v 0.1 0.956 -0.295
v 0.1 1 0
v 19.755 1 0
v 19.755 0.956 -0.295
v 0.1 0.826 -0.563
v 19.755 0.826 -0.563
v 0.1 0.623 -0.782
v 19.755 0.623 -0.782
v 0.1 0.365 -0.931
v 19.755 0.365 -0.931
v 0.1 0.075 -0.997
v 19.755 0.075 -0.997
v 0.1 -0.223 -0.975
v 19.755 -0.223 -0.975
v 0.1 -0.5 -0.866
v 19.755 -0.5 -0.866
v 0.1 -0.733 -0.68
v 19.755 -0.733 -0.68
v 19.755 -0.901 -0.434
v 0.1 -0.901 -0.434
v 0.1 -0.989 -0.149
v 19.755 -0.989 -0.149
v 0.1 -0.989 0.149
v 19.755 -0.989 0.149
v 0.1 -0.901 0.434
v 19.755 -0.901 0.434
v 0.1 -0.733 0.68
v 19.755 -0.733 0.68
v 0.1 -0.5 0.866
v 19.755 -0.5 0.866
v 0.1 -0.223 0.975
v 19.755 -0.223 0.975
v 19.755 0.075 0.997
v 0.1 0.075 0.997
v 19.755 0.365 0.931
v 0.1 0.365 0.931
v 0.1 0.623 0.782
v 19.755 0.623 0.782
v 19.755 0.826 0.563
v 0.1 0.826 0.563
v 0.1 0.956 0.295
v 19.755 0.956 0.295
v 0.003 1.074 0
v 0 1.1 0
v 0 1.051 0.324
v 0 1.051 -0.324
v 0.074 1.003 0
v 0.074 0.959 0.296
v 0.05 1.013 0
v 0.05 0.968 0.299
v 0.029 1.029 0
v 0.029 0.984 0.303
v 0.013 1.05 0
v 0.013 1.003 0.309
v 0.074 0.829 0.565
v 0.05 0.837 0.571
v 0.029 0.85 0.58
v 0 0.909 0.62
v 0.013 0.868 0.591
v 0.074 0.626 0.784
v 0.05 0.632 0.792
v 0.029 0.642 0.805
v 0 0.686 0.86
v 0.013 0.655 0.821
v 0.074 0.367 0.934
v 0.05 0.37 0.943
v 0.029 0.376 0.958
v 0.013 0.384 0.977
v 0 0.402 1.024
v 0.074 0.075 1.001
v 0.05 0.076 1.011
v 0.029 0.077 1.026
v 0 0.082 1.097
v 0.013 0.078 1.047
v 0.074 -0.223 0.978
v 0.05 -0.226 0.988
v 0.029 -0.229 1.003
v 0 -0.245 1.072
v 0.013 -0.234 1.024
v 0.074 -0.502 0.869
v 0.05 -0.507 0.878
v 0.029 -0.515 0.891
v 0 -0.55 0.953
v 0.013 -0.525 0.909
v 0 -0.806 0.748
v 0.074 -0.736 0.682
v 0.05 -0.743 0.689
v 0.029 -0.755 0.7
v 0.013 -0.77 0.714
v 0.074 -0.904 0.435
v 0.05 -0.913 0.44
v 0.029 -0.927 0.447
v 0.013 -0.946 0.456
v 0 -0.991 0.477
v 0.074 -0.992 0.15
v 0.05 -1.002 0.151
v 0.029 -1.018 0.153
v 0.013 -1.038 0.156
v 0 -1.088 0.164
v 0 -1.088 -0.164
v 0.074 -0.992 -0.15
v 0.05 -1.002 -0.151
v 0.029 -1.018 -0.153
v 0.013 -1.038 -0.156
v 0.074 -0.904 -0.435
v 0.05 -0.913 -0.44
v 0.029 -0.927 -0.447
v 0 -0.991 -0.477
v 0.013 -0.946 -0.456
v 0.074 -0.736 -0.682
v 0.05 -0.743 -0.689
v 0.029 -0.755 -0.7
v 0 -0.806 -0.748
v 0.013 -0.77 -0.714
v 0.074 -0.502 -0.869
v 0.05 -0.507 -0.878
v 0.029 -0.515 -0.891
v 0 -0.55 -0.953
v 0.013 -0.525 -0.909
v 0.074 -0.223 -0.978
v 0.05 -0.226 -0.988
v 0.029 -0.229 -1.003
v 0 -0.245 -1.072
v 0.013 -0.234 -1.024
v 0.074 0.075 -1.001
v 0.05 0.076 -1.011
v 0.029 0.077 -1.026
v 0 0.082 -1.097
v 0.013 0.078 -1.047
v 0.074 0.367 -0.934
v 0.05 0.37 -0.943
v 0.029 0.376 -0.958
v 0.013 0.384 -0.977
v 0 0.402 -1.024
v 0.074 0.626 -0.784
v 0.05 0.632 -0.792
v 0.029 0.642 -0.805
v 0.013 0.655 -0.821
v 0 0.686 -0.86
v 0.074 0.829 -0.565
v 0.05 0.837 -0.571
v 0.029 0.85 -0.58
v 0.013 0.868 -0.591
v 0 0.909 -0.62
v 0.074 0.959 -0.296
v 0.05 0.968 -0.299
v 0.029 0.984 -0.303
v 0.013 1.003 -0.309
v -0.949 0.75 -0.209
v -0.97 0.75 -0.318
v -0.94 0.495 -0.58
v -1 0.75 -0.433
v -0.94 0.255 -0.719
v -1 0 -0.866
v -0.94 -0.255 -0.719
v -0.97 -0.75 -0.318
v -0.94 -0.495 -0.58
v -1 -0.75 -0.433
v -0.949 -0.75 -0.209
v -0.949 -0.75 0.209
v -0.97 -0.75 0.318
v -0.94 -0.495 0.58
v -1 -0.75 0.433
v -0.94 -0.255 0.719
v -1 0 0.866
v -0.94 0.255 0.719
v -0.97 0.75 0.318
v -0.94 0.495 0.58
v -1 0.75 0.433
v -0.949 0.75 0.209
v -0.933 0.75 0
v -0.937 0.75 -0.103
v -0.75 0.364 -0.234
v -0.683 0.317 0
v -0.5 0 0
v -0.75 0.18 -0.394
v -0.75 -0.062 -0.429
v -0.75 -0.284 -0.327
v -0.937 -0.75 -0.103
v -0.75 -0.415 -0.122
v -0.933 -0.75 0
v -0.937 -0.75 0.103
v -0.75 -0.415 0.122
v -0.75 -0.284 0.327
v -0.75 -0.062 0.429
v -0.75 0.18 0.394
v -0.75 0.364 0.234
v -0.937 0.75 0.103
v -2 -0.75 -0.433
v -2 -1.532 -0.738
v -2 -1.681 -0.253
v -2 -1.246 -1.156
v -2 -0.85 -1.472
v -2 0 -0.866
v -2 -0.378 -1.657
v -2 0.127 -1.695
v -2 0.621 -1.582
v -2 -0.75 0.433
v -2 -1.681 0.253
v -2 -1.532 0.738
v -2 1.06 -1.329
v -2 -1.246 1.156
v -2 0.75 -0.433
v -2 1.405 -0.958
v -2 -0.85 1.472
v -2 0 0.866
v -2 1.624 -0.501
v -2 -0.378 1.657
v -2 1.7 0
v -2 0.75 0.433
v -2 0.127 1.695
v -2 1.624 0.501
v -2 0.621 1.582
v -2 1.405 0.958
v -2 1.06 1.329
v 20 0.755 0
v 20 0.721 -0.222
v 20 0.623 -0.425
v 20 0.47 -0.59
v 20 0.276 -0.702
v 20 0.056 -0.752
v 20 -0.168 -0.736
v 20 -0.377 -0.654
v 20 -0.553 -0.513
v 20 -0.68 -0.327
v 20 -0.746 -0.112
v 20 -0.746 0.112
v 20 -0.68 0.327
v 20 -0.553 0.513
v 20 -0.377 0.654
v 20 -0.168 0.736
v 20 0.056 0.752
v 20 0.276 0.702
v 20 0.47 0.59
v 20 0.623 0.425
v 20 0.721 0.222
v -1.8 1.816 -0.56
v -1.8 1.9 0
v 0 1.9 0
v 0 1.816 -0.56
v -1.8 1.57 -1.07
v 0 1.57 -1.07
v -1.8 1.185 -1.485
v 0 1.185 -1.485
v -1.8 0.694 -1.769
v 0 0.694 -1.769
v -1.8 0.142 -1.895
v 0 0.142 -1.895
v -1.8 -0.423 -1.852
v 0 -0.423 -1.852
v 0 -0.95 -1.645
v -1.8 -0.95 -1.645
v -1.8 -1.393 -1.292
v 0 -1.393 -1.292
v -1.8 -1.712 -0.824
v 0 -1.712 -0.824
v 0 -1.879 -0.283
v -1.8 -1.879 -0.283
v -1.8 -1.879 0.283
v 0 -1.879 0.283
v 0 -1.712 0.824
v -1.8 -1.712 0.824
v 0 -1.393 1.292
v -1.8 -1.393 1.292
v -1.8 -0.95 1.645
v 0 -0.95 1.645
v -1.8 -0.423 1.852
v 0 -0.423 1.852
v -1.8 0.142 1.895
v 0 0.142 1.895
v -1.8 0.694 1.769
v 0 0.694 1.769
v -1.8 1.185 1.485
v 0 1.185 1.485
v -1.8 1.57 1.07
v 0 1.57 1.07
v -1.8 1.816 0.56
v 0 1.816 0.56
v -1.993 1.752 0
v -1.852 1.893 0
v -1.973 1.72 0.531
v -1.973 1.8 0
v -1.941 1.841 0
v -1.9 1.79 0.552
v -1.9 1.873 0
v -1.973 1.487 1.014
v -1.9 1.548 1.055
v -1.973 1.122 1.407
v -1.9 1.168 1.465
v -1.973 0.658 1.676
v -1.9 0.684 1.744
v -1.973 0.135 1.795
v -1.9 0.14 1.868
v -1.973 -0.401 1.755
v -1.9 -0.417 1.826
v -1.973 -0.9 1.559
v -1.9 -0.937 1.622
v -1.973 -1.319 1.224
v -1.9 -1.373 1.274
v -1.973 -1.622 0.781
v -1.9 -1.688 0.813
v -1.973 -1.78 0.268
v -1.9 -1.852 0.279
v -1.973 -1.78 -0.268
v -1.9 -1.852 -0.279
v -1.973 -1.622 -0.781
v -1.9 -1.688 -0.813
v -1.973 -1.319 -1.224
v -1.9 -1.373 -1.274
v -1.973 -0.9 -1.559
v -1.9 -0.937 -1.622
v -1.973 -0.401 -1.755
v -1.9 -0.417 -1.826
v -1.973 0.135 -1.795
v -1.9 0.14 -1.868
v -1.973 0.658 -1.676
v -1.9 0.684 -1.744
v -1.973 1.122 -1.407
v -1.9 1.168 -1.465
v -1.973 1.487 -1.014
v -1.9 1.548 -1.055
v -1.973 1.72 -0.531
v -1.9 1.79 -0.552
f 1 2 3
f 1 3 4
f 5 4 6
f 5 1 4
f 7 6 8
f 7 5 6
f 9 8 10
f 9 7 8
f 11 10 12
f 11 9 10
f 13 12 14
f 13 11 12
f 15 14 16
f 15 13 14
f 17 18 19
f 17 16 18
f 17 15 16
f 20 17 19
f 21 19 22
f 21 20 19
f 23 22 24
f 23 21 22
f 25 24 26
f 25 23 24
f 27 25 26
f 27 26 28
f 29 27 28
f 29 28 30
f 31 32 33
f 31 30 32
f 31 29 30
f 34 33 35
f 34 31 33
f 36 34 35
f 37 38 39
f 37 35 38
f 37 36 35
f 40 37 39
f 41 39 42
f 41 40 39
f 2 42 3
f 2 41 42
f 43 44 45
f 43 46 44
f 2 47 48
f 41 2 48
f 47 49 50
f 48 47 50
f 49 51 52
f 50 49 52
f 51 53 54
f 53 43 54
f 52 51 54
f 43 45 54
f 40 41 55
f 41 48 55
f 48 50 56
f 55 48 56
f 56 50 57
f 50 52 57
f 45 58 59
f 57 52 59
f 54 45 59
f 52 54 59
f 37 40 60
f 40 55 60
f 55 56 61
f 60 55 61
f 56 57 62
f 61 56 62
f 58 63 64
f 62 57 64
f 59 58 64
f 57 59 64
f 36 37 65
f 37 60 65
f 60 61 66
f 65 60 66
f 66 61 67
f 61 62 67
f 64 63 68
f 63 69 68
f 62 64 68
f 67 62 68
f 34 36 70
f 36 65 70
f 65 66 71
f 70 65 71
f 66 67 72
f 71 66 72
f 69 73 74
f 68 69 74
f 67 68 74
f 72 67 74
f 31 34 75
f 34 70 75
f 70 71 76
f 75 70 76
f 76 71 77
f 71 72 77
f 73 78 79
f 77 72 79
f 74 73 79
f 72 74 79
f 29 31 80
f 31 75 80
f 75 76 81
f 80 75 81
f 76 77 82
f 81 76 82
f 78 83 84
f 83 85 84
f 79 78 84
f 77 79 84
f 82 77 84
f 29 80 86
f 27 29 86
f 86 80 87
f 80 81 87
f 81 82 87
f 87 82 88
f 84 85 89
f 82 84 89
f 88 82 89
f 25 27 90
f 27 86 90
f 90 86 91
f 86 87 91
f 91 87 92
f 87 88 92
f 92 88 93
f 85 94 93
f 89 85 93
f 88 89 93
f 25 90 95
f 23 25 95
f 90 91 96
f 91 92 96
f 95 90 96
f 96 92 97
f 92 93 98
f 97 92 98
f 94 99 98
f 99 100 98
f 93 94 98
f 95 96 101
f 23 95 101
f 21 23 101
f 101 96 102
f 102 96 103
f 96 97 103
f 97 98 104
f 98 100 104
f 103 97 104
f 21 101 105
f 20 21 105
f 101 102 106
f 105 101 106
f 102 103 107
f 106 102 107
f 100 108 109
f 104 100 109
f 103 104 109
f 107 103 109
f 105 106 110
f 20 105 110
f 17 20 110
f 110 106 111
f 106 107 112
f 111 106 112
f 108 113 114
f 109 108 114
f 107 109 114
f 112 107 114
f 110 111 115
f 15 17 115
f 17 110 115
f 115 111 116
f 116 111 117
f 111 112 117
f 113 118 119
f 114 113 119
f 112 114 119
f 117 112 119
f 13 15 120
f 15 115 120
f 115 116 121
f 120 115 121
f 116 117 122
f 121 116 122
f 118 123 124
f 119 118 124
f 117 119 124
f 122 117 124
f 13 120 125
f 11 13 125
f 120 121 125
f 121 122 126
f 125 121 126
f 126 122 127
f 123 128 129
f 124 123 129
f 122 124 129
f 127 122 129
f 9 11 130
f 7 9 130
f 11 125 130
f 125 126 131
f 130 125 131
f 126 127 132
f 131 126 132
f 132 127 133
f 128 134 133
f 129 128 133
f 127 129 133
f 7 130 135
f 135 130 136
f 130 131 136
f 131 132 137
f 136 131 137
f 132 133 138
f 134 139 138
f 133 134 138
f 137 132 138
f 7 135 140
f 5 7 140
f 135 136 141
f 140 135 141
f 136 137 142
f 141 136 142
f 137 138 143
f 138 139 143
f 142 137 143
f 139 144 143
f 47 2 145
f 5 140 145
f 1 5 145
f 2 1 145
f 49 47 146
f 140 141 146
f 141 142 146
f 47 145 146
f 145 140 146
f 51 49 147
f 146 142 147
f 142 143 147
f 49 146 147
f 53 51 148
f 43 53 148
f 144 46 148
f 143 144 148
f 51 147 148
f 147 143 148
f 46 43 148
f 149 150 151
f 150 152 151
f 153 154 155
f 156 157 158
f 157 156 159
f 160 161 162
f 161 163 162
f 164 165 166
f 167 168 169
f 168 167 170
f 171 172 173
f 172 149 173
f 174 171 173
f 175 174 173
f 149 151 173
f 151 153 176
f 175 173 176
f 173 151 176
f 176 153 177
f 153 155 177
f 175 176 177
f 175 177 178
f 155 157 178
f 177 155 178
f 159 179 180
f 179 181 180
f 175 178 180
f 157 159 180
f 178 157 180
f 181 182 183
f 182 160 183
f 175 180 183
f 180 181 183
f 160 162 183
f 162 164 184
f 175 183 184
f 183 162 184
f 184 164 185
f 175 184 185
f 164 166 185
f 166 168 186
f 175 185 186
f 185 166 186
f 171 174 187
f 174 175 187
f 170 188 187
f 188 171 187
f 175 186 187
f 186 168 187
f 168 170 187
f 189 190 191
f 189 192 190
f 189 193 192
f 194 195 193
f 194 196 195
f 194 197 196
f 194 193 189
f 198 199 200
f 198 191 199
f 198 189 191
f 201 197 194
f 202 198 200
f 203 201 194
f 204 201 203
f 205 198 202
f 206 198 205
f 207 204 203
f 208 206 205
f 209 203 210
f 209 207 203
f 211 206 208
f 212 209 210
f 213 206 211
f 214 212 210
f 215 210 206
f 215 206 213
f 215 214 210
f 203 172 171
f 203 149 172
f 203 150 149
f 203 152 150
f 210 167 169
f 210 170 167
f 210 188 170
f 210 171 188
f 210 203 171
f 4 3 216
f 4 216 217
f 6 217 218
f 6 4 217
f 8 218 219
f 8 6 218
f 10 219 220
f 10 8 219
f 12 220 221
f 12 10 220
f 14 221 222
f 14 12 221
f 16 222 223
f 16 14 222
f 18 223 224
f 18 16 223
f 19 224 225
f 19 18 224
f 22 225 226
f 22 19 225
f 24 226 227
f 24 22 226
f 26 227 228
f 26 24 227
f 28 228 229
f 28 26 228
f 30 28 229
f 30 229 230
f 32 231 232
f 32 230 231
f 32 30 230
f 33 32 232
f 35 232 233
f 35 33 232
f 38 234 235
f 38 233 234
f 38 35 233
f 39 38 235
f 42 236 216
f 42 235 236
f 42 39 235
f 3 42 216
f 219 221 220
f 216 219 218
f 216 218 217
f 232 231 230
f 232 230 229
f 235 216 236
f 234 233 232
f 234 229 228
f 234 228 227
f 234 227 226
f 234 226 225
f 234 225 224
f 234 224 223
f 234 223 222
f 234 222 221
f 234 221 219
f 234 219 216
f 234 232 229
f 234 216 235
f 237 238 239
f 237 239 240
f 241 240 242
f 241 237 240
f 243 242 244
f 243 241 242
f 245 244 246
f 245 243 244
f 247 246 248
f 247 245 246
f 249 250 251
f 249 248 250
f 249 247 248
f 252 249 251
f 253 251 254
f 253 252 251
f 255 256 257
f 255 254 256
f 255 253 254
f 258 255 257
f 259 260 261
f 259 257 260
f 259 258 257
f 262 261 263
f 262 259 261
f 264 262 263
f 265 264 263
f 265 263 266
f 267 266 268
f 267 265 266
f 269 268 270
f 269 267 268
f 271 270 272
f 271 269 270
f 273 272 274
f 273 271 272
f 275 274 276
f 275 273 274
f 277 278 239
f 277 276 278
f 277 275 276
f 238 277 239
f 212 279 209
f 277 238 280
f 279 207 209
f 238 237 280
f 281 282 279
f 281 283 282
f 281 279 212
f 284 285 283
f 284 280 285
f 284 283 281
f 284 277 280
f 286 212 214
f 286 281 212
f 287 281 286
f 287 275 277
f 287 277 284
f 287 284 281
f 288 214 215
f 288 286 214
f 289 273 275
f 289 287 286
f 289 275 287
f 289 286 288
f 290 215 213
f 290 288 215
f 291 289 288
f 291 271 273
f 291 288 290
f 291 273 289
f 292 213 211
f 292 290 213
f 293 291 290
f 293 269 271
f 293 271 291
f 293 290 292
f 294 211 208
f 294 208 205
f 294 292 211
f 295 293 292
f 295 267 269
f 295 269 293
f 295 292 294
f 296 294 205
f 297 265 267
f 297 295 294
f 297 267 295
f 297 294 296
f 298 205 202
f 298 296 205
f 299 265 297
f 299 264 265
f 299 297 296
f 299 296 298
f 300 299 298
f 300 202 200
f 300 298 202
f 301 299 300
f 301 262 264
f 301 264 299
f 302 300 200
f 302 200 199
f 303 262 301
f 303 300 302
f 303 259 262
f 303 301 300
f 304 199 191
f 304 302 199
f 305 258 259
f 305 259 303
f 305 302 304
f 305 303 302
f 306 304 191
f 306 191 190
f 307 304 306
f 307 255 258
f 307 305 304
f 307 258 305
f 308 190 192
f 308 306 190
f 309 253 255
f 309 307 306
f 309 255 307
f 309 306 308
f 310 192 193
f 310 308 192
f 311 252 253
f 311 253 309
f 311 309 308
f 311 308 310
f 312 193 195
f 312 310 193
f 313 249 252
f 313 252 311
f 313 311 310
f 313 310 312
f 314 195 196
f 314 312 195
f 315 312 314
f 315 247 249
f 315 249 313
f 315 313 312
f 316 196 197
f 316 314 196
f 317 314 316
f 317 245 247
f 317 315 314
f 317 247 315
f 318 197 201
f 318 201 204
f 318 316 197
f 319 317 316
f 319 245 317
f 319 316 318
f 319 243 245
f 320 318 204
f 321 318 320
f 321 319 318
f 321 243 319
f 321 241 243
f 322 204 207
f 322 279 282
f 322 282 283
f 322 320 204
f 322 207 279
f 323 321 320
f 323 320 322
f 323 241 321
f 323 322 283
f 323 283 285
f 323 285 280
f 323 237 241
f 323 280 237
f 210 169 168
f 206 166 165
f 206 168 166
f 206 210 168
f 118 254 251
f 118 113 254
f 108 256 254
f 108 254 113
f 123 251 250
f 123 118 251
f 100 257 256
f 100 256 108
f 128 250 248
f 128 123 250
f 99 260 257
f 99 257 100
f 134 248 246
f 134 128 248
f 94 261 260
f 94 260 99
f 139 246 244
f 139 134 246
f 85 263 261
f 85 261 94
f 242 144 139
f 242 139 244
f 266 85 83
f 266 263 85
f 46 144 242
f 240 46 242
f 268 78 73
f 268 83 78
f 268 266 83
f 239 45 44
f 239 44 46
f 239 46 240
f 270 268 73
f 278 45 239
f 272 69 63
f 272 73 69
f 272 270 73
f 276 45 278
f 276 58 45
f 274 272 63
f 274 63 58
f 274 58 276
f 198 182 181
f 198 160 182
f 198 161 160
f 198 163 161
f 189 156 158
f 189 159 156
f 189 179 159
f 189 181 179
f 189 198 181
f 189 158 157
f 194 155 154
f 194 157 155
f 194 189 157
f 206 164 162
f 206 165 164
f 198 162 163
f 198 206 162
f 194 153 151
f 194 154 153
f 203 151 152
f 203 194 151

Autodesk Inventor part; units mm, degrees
ref_plane "YZ Plane" through (0, 0, 0) normal (1, 0, 0) x (0, 1, 0)
ref_plane "XZ Plane" through (0, 0, 0) normal (0, 1, 0) x (-1, 0, 0)
sketch "Skizze1" plane through (0, 0, 0) normal (0, 0, 1) x (1, 0, 0)
  line L0 (-0.5, 0) -> (20, 0)
  line L1 (20, 0) -> (20, 1)
  line L2 (20, 1) -> (1, 1)
  line L3 (1, 1) -> (0.7545, 1)
  line L4 (0.7545, 1) -> (0, 1)
  line L5 (0, 1) -> (0, 1.9)
  line L6 (0, 1.9) -> (-2, 1.9)
  line L7 (-2, 1.9) -> (-2, 0.866)
  line L8 (-2, 0.866) -> (-1, 0.866)
  line L9 (-1, 0.866) -> (-0.5, 0)
  line L10 (-6.4, 0) -> (24.4, 0) projected
  line L11 (0, -0.38) -> (0, 2.28) projected
  line L12 (1, 1) -> (0, 1) construction
  dimension "d1" = 19
  dimension "d2" = 0.2455
  dimension "d3" = 2
  dimension "d4" = 1
  dimension "d5" = 60
  dimension "d6" = 2
  dimension "d7" = 2
  dimension "d8" = 1.7321
  dimension "d9" = 3.8
  dimension "d26" = 20
revolve "Körper" add sketch "Skizze1" angle 360 about axis through (-0.5, 0, 0) along (1, 0, 0)
sketch "Skizze2" plane through (-2, 0, 0) normal (-1, 0, 0) x (0, 0, 1)
  circle A0 centre (0, 0) radius 0.866 projected
  line L0 (0, -2.66) -> (0, 2.66) projected
  line L1 (-2.66, 0) -> (2.66, 0) projected
  line L2 (0.866, 0) -> (0.433, -0.75)
  line L3 (0.433, -0.75) -> (-0.433, -0.75)
  line L4 (-0.433, -0.75) -> (-0.866, 0)
  line L5 (-0.866, 0) -> (-0.433, 0.75)
  line L6 (-0.433, 0.75) -> (0.433, 0.75)
  line L7 (0.433, 0.75) -> (0.866, 0)
extrude "Loch" add sketch "Skizze2" against normal up to next contours L7 A0 | A0 L2 | L6 L0 A0 | A0 L0 L3 | L0 L6 A0 | A0 L3 L0 | L4 A0 | A0 L5
fillet "Rundung1" radius 0.2 1 edges at (-2, -1.9, 0)
thread "Gewinde" size "M2x0.4" class "6g" standard "ISO Metric profile" length 19
chamfer "Fase1" distance 0.2454 distance2 0.2454 1 edges at (20, -1, 0) measured on face at (20, -0.4443, -0.4503)
ref_plane "Work Plane1" through (29, 0, 0) normal (0, -1, 0) x (1, 0, 0)
fillet "Fillet2" radius 0.1 1 edges at (0, -1, 0)
equation "\"d1\" = GEL"
equation "\"d3\" = KOH"
equation "\"d4\" = INTI"
equation "\"d6\" = GD"
equation "\"d7\" = BDM"
equation "\"d8\" = 1.1547 * SW"
equation "\"d9\" = KOD"
equation "\"d26\" = NLG"
equation "\"d30\" = R"
equation "\"d17\" = RR"
equation "\"d13\" = GEL"
equation "\"d15\" = -0.5 * SPD + 0.5 * GD"
equation "\"d16\" = GUL"
equation "\"GD\" = NND"
equation "\"NLG\" = 20"
equation "\"GEL\" = 19"
equation "\"KOD\" = 3.8"
equation "\"KOH\" = 2"
equation "\"INTI\" = 1"
equation "\"GAL\" = 0.61345 * PTC"
equation "\"GUL\" = 0.61345 * PTC"
equation "\"BDM\" = NND"
equation "\"SW\" = 1.5"
equation "\"RR\" = 0.2"
equation "\"SPD\" = NND - 1.2269 * PTC"
equation "\"R\" = 0.1"
equation "\"TOA\" = 30deg"
equation "\"GD1\" = THREADDIA - 1.2269 * PTC"
equation "\"THREADDIA\" = 2"
equation "\"FAWI\" = 45deg"
equation "\"ANG\" = 120deg"
equation "\"PTC\" = 0.4"
equation "\"NND\" = 2"
equation "\"E0\" = 1.155 * SW"
properties part number "DIN 912 - M2 x 20" material "Stahl, weich"
